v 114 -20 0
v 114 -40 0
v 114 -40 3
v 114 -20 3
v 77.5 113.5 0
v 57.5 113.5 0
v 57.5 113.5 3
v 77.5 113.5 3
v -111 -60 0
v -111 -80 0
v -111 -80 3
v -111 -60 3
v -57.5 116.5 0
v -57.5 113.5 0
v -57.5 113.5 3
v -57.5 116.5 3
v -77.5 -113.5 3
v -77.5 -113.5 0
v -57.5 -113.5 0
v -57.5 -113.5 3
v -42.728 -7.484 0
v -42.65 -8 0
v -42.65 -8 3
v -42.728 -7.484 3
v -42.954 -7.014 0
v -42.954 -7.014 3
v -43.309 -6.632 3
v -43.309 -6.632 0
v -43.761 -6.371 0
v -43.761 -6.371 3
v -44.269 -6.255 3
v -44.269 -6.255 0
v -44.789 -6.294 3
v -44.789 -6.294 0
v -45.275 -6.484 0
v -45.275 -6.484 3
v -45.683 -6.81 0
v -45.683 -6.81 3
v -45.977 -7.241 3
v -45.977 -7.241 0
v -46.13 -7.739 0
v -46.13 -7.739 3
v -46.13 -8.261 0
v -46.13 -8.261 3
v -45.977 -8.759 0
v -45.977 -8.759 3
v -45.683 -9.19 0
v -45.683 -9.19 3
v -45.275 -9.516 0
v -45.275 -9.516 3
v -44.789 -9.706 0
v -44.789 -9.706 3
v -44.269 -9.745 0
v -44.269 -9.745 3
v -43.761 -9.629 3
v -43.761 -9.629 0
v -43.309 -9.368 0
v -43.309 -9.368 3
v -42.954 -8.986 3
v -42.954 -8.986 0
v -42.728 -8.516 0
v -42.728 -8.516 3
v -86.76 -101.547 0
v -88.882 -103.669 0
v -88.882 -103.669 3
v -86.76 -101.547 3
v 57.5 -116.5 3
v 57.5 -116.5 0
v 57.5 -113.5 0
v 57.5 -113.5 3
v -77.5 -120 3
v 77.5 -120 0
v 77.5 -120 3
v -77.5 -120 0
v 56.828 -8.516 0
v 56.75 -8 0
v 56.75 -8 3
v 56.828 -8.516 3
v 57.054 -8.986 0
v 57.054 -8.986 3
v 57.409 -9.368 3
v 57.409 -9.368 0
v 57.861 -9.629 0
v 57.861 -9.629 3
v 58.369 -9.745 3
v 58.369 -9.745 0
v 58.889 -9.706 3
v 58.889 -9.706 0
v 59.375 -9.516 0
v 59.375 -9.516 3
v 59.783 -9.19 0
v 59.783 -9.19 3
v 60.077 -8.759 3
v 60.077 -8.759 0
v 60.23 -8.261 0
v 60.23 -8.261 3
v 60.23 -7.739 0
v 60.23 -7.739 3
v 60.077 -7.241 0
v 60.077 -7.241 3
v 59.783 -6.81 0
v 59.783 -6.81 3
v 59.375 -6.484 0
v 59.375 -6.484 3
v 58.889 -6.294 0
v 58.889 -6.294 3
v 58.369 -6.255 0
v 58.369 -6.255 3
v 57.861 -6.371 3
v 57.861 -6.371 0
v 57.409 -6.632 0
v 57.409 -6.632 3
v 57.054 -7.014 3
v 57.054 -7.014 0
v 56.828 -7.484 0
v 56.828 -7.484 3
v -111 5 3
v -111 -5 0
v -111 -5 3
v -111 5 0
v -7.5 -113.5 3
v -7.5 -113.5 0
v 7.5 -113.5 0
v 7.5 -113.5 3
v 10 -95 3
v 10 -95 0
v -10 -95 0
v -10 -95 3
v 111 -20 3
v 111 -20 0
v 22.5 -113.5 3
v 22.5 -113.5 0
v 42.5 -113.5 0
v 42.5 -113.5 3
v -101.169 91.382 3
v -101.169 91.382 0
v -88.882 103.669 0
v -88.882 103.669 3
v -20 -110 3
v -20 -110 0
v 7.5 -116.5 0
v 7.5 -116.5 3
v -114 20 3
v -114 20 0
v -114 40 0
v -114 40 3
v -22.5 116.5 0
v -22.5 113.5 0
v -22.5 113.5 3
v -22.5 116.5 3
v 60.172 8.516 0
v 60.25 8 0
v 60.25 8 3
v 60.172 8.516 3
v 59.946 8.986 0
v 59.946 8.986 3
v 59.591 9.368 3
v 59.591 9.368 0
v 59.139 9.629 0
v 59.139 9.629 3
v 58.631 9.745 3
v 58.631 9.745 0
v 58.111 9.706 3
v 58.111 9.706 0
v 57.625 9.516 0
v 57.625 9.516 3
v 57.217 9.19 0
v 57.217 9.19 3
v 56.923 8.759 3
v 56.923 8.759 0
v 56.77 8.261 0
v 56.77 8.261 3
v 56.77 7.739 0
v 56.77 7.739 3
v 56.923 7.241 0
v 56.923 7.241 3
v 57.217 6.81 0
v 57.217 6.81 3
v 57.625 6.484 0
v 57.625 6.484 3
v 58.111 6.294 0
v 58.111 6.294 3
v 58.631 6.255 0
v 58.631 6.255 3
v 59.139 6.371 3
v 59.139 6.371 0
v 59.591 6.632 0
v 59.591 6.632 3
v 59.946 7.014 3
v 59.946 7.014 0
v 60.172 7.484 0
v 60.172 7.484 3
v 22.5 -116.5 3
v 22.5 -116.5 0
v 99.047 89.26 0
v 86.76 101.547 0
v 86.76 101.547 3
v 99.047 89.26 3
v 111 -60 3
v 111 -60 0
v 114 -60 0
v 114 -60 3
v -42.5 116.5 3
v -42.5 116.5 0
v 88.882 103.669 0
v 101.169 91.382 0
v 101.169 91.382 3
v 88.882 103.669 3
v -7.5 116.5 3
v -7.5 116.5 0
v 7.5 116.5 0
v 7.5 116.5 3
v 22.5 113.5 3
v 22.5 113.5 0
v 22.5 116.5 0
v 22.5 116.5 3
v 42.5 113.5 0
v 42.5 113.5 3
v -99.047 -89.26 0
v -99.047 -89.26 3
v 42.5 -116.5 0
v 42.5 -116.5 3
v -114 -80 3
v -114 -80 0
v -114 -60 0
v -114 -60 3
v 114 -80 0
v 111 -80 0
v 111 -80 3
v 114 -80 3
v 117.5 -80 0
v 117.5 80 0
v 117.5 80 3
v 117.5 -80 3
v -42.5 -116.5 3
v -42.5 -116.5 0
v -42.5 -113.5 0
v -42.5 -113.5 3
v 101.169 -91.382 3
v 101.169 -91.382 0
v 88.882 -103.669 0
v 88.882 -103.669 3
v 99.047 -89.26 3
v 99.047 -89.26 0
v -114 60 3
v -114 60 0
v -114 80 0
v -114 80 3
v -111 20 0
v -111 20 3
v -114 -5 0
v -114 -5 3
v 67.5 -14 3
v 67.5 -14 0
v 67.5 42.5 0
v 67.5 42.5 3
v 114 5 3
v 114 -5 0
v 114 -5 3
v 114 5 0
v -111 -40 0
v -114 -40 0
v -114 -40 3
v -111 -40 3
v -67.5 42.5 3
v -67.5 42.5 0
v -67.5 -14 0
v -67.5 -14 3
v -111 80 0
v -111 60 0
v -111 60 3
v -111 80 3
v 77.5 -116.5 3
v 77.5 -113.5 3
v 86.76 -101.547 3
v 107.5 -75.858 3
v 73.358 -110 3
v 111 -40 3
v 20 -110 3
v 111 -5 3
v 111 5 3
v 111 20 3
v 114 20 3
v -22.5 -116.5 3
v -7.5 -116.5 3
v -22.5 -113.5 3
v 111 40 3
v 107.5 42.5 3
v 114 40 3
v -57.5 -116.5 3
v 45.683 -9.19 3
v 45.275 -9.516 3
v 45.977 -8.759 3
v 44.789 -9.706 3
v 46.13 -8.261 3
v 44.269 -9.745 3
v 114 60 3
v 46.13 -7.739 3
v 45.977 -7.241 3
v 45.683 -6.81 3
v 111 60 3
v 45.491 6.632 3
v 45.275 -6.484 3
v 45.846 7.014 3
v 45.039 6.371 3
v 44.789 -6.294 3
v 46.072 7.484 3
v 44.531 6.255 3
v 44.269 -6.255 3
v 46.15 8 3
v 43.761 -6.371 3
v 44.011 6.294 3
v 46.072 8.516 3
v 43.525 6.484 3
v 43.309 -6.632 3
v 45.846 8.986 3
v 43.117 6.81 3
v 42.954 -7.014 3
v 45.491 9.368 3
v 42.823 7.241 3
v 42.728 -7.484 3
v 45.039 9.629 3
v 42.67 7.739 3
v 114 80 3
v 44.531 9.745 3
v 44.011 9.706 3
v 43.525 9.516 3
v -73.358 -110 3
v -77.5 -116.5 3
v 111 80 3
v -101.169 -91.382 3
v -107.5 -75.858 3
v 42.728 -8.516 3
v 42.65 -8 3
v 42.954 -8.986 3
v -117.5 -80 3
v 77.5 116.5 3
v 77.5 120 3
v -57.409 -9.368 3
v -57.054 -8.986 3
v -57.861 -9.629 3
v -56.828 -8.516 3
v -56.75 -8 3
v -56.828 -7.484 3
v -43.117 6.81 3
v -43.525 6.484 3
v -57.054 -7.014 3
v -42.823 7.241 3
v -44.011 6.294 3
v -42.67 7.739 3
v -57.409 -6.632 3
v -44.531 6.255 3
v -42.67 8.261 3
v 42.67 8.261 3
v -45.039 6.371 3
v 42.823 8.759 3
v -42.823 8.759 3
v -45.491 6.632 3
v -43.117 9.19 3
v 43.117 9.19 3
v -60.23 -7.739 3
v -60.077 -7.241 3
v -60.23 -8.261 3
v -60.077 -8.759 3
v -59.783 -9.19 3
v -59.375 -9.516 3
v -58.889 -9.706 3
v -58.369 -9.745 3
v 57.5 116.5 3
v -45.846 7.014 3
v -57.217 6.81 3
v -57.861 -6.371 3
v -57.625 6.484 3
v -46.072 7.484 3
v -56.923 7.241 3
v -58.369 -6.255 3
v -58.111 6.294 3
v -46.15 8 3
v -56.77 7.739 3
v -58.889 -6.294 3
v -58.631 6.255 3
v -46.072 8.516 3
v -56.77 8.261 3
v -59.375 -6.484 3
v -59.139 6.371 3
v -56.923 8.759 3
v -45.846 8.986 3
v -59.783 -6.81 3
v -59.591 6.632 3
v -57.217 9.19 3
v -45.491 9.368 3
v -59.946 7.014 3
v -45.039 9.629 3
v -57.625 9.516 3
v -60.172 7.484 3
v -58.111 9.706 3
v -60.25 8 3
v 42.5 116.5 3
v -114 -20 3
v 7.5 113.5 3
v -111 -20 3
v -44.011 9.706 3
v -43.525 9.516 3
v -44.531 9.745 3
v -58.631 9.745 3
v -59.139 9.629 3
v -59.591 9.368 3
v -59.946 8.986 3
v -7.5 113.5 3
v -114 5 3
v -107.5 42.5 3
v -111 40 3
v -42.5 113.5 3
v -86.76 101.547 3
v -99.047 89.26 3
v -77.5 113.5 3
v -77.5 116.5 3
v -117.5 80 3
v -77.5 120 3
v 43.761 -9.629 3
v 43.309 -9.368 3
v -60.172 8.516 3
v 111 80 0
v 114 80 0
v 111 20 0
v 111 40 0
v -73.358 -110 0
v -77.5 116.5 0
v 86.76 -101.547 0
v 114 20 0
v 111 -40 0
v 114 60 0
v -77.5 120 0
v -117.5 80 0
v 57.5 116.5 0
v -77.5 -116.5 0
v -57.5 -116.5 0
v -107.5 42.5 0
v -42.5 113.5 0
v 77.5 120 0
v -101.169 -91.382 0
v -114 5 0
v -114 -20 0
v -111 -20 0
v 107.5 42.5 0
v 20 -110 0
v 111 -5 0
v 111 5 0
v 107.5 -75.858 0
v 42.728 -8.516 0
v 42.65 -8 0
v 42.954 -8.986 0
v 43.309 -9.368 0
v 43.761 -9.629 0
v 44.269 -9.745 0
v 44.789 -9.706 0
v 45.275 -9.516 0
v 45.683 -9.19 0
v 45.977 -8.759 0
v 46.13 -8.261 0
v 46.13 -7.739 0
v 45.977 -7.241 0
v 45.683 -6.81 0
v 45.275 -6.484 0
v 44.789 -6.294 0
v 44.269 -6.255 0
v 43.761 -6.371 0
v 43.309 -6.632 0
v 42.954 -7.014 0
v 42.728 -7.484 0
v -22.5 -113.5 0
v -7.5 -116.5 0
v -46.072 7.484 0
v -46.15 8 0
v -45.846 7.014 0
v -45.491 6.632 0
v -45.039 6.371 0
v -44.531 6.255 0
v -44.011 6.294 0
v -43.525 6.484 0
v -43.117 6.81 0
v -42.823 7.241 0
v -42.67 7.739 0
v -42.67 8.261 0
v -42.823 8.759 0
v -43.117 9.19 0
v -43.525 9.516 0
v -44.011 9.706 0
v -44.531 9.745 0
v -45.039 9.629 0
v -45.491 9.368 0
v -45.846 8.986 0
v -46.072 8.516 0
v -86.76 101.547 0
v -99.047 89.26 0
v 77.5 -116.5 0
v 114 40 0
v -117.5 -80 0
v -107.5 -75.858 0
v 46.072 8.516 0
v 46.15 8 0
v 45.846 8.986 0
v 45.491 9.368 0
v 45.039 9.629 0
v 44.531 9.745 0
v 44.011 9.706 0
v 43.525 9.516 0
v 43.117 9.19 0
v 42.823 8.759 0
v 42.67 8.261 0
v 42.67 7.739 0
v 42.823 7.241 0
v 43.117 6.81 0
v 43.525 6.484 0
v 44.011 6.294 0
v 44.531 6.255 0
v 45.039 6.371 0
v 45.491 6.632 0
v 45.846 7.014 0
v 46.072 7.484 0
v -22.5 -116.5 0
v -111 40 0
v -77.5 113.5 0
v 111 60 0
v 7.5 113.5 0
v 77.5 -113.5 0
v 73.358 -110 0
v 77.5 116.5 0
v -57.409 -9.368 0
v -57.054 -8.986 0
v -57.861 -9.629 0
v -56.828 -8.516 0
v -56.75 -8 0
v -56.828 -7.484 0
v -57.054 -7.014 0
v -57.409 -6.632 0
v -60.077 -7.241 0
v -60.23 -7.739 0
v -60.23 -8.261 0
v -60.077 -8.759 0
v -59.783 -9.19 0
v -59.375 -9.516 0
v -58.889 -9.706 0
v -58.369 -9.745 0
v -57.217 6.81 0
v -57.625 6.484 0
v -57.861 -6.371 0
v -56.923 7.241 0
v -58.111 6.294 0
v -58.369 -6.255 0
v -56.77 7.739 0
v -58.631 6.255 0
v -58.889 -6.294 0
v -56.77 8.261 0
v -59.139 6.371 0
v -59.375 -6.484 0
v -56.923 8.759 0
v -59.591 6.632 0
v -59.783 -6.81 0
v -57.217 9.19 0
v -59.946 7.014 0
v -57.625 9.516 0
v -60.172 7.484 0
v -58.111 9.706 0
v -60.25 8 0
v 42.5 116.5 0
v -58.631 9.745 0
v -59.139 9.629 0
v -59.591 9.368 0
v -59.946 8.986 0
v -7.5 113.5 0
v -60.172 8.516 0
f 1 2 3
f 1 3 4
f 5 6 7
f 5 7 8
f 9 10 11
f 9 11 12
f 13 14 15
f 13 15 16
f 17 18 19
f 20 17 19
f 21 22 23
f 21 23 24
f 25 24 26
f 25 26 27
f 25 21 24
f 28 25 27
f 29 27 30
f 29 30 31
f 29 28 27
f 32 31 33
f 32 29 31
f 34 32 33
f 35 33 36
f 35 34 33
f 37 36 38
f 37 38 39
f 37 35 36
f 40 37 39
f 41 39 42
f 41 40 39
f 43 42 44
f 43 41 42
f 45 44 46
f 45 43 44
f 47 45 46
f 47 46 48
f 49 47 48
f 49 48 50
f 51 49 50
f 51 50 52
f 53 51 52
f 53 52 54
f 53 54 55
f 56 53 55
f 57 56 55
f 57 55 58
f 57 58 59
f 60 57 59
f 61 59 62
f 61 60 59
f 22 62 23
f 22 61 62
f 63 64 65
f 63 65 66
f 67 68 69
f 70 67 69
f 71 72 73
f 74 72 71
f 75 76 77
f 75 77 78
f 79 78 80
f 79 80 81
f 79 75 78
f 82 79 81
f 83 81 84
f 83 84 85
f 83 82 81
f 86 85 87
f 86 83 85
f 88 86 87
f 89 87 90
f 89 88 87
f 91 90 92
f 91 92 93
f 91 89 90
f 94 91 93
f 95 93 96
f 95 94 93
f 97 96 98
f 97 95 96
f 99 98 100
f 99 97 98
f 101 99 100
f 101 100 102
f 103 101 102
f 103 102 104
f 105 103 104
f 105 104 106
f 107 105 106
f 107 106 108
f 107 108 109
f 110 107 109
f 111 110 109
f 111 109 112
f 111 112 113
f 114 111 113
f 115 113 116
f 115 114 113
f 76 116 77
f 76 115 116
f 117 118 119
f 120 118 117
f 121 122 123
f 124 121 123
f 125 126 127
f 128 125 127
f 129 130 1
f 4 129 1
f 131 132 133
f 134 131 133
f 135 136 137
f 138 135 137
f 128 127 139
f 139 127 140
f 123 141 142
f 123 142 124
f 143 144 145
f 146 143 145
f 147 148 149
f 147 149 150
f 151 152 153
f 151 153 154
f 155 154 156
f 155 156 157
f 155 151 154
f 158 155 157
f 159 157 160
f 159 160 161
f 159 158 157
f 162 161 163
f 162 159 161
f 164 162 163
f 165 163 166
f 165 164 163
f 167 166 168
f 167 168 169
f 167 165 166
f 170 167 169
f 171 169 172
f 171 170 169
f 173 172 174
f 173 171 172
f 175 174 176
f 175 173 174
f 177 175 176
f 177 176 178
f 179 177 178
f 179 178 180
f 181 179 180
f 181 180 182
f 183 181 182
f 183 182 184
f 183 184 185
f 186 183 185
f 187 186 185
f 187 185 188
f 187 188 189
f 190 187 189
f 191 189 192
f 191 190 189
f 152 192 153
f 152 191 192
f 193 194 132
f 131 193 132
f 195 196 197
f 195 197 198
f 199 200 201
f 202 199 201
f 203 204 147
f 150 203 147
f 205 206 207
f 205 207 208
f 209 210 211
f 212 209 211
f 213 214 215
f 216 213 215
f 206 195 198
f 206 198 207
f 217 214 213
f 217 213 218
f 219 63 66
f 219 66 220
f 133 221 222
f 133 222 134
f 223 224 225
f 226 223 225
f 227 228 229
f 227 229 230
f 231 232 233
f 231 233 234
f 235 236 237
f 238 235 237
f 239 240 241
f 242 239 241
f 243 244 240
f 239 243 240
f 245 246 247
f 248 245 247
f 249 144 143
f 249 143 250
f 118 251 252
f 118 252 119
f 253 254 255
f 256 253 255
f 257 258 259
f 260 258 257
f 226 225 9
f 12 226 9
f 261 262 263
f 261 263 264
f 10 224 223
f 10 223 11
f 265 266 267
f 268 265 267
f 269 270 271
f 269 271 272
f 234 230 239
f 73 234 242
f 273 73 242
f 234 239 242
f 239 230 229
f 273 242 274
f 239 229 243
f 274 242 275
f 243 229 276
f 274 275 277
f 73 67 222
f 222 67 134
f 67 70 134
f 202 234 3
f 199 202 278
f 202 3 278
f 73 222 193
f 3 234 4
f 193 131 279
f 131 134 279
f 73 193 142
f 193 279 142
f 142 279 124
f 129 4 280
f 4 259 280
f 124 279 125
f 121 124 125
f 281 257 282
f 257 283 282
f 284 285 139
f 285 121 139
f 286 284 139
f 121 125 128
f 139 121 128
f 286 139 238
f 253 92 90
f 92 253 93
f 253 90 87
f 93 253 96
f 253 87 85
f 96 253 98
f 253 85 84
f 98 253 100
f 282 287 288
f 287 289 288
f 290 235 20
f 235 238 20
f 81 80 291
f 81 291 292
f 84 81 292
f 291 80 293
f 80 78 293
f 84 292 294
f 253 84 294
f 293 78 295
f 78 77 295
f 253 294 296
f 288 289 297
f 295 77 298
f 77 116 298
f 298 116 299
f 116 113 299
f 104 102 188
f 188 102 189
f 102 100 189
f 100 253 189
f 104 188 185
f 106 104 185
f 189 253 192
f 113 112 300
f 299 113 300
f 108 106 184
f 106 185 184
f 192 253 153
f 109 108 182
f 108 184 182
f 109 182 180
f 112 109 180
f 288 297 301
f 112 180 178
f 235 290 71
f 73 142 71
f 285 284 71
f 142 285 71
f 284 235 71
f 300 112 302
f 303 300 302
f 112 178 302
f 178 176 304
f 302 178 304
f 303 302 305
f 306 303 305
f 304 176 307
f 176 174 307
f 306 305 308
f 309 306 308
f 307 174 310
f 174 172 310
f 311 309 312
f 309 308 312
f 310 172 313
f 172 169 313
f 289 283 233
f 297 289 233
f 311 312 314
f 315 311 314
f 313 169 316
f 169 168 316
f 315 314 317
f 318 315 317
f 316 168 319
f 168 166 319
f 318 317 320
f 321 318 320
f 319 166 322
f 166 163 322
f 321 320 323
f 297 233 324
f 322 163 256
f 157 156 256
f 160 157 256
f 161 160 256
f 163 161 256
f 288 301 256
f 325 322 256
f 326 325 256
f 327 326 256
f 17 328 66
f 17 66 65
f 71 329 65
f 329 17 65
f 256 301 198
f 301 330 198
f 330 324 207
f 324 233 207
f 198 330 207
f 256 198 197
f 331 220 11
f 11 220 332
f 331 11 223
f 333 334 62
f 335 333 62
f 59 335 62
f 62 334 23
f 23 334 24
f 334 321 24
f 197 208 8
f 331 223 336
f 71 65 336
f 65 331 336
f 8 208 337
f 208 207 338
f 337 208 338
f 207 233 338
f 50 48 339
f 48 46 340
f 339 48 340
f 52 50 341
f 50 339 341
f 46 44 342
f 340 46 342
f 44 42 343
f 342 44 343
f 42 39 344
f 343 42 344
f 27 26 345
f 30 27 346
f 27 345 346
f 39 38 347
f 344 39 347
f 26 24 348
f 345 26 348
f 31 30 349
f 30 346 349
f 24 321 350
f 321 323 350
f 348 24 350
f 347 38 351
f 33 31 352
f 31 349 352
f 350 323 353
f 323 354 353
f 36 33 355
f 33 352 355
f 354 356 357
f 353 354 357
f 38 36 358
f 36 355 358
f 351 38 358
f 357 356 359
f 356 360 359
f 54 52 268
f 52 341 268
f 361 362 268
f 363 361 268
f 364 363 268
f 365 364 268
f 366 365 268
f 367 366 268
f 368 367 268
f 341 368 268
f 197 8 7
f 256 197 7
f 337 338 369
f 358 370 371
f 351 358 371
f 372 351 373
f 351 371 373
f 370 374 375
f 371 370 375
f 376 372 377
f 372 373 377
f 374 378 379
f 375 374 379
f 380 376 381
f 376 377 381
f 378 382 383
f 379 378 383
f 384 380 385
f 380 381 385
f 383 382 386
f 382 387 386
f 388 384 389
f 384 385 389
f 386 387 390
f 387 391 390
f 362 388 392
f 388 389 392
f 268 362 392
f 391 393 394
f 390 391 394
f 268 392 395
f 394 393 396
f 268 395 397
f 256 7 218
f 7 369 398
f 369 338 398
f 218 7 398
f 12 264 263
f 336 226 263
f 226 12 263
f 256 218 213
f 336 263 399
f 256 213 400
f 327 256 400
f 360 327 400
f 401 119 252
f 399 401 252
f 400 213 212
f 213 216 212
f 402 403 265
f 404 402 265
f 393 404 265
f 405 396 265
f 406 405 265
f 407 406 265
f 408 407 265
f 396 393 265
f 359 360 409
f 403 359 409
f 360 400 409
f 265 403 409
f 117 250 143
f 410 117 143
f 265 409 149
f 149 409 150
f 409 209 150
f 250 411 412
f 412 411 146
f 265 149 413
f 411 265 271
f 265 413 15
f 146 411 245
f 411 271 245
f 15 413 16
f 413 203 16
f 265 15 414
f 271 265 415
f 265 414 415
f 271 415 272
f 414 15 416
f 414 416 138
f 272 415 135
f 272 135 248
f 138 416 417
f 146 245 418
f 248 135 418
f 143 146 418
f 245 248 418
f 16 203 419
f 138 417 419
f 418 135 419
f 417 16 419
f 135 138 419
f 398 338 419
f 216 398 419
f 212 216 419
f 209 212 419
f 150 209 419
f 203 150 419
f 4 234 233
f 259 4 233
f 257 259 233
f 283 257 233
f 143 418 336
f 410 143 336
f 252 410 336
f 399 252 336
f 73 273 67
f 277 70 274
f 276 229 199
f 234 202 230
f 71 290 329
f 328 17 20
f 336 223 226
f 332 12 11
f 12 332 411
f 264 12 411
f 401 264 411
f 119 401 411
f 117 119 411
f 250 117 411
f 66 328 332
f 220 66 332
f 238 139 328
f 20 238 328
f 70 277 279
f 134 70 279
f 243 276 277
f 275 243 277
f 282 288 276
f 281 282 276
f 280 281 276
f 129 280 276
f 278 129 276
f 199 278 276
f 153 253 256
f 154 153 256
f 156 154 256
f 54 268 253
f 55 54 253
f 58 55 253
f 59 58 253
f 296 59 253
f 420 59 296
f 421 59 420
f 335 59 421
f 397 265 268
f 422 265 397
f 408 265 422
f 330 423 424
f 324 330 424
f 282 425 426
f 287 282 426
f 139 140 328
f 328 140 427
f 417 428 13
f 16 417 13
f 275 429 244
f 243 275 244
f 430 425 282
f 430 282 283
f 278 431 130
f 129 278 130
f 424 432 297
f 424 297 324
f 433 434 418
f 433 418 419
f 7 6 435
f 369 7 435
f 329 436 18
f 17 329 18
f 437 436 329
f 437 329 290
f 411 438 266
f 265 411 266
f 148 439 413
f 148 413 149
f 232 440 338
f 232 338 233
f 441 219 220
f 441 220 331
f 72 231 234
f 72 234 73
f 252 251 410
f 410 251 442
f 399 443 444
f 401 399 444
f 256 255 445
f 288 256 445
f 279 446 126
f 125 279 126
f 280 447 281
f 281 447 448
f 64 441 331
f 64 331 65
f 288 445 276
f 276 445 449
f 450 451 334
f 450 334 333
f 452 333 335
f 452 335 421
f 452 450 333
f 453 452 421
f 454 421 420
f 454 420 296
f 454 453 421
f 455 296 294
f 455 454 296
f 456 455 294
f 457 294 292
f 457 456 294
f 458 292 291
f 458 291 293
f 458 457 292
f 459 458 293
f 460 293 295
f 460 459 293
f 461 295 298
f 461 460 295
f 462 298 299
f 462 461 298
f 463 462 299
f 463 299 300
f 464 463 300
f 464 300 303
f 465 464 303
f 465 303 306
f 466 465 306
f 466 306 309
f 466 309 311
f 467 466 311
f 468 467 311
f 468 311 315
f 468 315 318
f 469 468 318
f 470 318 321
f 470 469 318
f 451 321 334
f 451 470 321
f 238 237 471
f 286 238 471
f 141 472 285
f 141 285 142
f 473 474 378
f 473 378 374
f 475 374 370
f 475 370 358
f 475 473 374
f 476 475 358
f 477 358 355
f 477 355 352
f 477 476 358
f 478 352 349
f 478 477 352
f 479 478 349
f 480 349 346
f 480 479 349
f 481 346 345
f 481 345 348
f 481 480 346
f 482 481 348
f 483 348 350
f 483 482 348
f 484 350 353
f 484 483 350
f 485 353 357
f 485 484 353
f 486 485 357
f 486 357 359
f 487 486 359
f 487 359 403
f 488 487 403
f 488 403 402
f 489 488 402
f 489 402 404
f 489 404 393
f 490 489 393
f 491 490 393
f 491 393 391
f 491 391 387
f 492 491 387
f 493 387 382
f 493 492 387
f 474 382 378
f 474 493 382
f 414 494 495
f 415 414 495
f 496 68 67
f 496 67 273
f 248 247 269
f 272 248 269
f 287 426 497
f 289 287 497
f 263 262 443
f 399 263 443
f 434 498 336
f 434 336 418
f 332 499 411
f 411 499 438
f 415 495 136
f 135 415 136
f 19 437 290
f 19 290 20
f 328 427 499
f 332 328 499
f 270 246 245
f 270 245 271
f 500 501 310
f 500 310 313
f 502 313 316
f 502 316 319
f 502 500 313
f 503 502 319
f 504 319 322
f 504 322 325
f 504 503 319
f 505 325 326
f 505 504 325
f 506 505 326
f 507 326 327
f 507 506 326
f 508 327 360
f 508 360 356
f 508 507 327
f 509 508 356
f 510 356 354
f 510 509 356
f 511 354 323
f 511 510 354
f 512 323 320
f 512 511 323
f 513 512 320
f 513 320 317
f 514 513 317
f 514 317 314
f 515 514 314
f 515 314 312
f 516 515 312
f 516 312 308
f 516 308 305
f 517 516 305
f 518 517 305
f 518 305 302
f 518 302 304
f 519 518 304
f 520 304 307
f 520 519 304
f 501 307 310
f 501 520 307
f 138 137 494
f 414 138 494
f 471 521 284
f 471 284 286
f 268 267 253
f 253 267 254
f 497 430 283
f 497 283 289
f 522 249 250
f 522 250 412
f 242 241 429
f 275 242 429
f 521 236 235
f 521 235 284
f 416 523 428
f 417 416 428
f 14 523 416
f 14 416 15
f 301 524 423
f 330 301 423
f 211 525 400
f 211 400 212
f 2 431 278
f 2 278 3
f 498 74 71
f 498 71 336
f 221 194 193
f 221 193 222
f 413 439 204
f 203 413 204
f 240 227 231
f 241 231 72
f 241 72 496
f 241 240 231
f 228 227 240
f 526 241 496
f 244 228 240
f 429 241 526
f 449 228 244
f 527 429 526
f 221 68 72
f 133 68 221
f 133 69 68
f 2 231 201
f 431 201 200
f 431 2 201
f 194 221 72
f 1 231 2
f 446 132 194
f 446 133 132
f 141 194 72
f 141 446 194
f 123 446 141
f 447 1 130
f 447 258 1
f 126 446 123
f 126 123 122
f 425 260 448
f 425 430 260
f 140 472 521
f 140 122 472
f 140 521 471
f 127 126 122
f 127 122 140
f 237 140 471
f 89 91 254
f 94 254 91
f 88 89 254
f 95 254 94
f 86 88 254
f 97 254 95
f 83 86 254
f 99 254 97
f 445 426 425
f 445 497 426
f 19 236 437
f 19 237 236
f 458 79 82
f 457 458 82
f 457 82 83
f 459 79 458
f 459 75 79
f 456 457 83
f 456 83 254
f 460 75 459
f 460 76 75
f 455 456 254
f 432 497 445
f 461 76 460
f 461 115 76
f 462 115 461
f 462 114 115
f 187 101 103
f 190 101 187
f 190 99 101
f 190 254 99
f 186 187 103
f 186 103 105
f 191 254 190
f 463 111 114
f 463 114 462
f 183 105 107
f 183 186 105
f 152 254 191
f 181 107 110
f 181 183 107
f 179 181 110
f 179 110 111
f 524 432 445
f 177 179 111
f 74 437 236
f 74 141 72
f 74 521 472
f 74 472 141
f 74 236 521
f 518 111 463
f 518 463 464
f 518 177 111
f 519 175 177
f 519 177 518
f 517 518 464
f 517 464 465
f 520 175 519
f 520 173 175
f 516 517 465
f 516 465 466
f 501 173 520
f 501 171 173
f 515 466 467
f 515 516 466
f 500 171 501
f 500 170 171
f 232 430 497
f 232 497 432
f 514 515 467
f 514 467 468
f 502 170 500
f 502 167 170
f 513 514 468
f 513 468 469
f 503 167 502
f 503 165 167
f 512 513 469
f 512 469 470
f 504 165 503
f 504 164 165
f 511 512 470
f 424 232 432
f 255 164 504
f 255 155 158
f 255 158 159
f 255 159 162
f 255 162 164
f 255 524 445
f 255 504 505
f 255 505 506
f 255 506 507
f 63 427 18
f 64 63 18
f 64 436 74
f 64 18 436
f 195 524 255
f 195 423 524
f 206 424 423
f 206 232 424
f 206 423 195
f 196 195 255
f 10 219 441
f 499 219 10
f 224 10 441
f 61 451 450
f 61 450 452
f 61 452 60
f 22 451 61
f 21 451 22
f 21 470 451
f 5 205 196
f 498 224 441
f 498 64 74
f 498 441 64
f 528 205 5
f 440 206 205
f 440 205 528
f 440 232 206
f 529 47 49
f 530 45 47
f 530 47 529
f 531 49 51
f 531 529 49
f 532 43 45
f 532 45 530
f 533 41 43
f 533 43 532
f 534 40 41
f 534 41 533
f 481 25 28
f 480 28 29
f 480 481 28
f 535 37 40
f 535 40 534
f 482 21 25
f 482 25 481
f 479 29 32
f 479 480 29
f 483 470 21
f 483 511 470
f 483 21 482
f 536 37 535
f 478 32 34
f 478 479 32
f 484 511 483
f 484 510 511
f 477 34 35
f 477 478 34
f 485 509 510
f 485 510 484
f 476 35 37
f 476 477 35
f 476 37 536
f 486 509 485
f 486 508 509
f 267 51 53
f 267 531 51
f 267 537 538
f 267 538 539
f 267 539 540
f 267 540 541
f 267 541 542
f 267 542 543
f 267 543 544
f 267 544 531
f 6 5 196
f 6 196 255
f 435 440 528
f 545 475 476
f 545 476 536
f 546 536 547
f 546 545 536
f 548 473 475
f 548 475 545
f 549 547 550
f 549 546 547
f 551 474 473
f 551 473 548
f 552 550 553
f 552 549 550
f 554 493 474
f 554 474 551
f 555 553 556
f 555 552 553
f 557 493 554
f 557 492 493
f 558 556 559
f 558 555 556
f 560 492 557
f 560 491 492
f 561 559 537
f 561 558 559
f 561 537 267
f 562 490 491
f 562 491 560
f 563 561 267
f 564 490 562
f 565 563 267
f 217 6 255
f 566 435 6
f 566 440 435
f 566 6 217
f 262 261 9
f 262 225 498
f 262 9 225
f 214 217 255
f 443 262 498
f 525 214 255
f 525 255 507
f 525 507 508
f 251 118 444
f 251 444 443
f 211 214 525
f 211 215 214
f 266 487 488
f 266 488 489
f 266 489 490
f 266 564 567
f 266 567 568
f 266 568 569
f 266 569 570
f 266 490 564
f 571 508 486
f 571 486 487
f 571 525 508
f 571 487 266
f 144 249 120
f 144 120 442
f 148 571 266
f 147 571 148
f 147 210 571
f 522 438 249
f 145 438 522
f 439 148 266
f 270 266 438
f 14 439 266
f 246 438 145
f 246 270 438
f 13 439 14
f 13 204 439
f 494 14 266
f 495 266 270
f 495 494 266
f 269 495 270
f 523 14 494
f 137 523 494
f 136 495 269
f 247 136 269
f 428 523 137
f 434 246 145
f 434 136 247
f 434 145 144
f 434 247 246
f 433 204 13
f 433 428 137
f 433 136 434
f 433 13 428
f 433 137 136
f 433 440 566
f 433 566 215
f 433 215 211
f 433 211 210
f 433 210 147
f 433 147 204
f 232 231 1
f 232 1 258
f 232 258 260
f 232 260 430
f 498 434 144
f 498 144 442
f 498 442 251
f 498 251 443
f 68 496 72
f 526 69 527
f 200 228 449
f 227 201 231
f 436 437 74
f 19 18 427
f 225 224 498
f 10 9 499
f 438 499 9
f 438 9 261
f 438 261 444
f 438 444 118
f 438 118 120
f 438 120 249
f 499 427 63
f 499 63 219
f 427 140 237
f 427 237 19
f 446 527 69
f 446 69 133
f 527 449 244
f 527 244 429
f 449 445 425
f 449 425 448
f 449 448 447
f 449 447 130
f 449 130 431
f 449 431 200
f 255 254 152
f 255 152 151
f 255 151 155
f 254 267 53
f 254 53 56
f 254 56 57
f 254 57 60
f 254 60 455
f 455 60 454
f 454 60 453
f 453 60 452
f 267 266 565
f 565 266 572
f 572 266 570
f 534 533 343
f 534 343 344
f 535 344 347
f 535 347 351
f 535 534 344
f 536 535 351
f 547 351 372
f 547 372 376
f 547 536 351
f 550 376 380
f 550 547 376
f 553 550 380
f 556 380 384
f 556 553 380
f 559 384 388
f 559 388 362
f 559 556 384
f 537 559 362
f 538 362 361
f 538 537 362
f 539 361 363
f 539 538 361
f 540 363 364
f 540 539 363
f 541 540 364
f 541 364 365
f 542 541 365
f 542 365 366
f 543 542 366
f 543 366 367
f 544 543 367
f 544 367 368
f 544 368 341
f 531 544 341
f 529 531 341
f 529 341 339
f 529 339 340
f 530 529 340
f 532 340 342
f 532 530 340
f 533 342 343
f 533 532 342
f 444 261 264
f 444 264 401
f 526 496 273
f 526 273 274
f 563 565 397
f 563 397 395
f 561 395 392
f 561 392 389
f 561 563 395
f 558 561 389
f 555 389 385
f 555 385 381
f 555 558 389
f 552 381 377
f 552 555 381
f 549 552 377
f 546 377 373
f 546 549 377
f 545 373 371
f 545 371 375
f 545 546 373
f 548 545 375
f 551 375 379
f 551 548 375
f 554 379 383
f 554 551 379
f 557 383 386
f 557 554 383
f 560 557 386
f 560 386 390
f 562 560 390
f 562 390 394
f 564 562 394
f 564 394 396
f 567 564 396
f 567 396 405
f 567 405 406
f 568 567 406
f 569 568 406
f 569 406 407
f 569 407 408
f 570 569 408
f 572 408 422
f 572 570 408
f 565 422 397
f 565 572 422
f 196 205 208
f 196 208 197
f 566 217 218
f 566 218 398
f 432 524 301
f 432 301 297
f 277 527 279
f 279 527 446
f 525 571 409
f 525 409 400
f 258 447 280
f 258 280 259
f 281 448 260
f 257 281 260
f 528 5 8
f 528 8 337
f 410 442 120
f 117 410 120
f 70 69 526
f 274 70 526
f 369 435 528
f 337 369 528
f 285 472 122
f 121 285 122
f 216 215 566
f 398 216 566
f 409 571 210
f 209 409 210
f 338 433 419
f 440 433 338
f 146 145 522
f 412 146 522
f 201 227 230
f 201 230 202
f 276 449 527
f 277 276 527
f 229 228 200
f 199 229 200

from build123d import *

# Parameters (mm, degrees)
SKICA2_R                = 1.75
SKICA2_W                = 3
SKICA2_H                = 20
SKICA2_H_2              = 10
SKICA2_W_2              = 20
SKICA2_H_3              = 3
SKICA2_W_3              = 15
P_IDAT_VYSUNUT_M1_DEPTH = 3


with BuildPart() as part:
    # Skica2 → Přidat vysunutím1 (new body)
    with BuildSketch(Plane.XY):
        Polygon((-117.5, 80), (-77.5, 120), (77.5, 120), (117.5, 80), (117.5, -80), (77.5, -120), (-77.5, -120), (-117.5, -80), align=None)
        with Locations((58.5, 8)):
            Circle(SKICA2_R, mode=Mode.SUBTRACT)
        with Locations((44.4, 8)):
            Circle(SKICA2_R, mode=Mode.SUBTRACT)
        with Locations(Location((44.4, -8, 0), (0, 0, 180))):
            Circle(SKICA2_R, mode=Mode.SUBTRACT)
        with Locations(Location((58.5, -8, 0), (0, 0, 180))):
            Circle(SKICA2_R, mode=Mode.SUBTRACT)
        with Locations((-44.4, -8)):
            Circle(SKICA2_R, mode=Mode.SUBTRACT)
        with Locations((-58.5, -8)):
            Circle(SKICA2_R, mode=Mode.SUBTRACT)
        with Locations(Location((-58.5, 8, 0), (0, 0, 180))):
            Circle(SKICA2_R, mode=Mode.SUBTRACT)
        with Locations(Location((-44.4, 8, 0), (0, 0, 180))):
            Circle(SKICA2_R, mode=Mode.SUBTRACT)
        Polygon((-107.5, -42.5), (-107.5, 42.5), (-67.5, 42.5), (-67.5, -14), (67.5, -14), (67.5, 42.5), (107.5, 42.5), (107.5, -42.5), (107.5, -75.857864376), (73.357864376, -110), (20, -110), (10, -95), (-10, -95), (-20, -110), (-73.357864376, -110), (-107.5, -75.857864376), align=None, mode=Mode.SUBTRACT)
        with Locations((-112.5, 70)):
            Rectangle(SKICA2_W, SKICA2_H, mode=Mode.SUBTRACT)
        with Locations((-112.5, 30)):
            Rectangle(SKICA2_W, SKICA2_H, mode=Mode.SUBTRACT)
        with Locations((-112.5, 0)):
            Rectangle(SKICA2_W, SKICA2_H_2, mode=Mode.SUBTRACT)
        with Locations((-112.5, -30)):
            Rectangle(SKICA2_W, SKICA2_H, mode=Mode.SUBTRACT)
        with Locations((-112.5, -70)):
            Rectangle(SKICA2_W, SKICA2_H, mode=Mode.SUBTRACT)
        with Locations((112.5, -70)):
            Rectangle(SKICA2_W, SKICA2_H, mode=Mode.SUBTRACT)
        with Locations((112.5, -30)):
            Rectangle(SKICA2_W, SKICA2_H, mode=Mode.SUBTRACT)
        with Locations((112.5, 0)):
            Rectangle(SKICA2_W, SKICA2_H_2, mode=Mode.SUBTRACT)
        with Locations((112.5, 30)):
            Rectangle(SKICA2_W, SKICA2_H, mode=Mode.SUBTRACT)
        with Locations((112.5, 70)):
            Rectangle(SKICA2_W, SKICA2_H, mode=Mode.SUBTRACT)
        with Locations((-67.5, 115)):
            Rectangle(SKICA2_W_2, SKICA2_H_3, mode=Mode.SUBTRACT)
        with Locations((-32.5, 115)):
            Rectangle(SKICA2_W_2, SKICA2_H_3, mode=Mode.SUBTRACT)
        with Locations((0, 115)):
            Rectangle(SKICA2_W_3, SKICA2_H_3, mode=Mode.SUBTRACT)
        with Locations((32.5, 115)):
            Rectangle(SKICA2_W_2, SKICA2_H_3, mode=Mode.SUBTRACT)
        with Locations((67.5, 115)):
            Rectangle(SKICA2_W_2, SKICA2_H_3, mode=Mode.SUBTRACT)
        with Locations((67.5, -115)):
            Rectangle(SKICA2_W_2, SKICA2_H_3, mode=Mode.SUBTRACT)
        with Locations((32.5, -115)):
            Rectangle(SKICA2_W_2, SKICA2_H_3, mode=Mode.SUBTRACT)
        with Locations((0, -115)):
            Rectangle(SKICA2_W_3, SKICA2_H_3, mode=Mode.SUBTRACT)
        with Locations((-32.5, -115)):
            Rectangle(SKICA2_W_2, SKICA2_H_3, mode=Mode.SUBTRACT)
        with Locations((-67.5, -115)):
            Rectangle(SKICA2_W_2, SKICA2_H_3, mode=Mode.SUBTRACT)
        Polygon((101.168524548, -91.381727984), (88.881727984, -103.668524548), (86.76040764, -101.547204204), (99.047204204, -89.26040764), align=None, mode=Mode.SUBTRACT)
        Polygon((-86.76040764, -101.547204204), (-99.047204204, -89.26040764), (-101.168524548, -91.381727984), (-88.881727984, -103.668524548), align=None, mode=Mode.SUBTRACT)
        Polygon((86.76040764, 101.547204204), (99.047204204, 89.26040764), (101.168524548, 91.381727984), (88.881727984, 103.668524548), align=None, mode=Mode.SUBTRACT)
        Polygon((-88.881727984, 103.668524548), (-86.76040764, 101.547204204), (-99.047204204, 89.26040764), (-101.168524548, 91.381727984), align=None, mode=Mode.SUBTRACT)
    extrude(amount=P_IDAT_VYSUNUT_M1_DEPTH)


solid = part.part
